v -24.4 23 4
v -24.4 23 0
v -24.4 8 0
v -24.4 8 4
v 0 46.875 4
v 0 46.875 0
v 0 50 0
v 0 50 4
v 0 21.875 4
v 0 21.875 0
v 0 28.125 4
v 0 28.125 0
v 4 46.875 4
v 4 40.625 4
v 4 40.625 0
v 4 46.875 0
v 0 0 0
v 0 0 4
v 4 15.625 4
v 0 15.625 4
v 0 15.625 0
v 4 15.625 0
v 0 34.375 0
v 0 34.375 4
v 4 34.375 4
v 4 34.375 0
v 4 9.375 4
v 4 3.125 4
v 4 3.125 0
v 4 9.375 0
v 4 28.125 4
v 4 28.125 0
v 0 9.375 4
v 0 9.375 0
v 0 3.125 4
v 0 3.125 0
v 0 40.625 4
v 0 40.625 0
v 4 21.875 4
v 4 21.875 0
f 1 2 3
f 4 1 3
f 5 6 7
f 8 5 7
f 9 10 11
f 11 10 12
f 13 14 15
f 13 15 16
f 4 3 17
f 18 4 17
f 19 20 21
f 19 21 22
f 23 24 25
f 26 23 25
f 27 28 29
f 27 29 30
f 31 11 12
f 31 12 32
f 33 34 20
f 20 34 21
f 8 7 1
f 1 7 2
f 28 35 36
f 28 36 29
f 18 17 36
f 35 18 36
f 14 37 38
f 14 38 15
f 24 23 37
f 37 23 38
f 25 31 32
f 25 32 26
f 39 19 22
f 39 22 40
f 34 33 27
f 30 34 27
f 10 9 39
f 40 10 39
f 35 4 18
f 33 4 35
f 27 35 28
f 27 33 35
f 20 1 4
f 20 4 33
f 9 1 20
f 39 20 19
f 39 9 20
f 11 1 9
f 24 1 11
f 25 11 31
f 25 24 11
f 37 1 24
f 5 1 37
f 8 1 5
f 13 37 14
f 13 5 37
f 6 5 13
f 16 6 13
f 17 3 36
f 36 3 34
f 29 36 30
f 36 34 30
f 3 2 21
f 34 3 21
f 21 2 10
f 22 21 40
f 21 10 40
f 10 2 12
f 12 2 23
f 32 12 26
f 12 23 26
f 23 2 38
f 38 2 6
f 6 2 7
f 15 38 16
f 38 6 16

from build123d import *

# Parameters (mm, degrees)
ESTRUSIONE_ESTRUSIONE1_DEPTH = 4
SCHIZZO2_W                   = 4
SCHIZZO2_H                   = 6.25
ESTRUSIONE_ESTRUSIONE2_DEPTH = 4
RIPETIZIONE_A_L1_COUNT       = 4
RIPETIZIONE_A_L1_PITCH       = 12.5


with BuildPart() as part:
    # Schizzo1 → Estrusione-Estrusione1 (new body)
    with BuildSketch(Plane.XY):
        Polygon((-24.4, 23), (-24.4, 8), (0, 0), (0, 50), align=None)
    extrude(amount=ESTRUSIONE_ESTRUSIONE1_DEPTH)

    # Schizzo2 → Estrusione-Estrusione2 (add)
    with BuildSketch(Plane.XY.offset(4)):
        with Locations((2, 43.75)):
            Rectangle(SCHIZZO2_W, SCHIZZO2_H)
    estrusione_estrusione2 = extrude(amount=-ESTRUSIONE_ESTRUSIONE2_DEPTH)

    # Ripetizione a L1: Estrusione-Estrusione2 ×4
    with Locations(*[(0, -i * RIPETIZIONE_A_L1_PITCH, 0) for i in range(1, RIPETIZIONE_A_L1_COUNT)]):
        add(estrusione_estrusione2)


solid = part.part
